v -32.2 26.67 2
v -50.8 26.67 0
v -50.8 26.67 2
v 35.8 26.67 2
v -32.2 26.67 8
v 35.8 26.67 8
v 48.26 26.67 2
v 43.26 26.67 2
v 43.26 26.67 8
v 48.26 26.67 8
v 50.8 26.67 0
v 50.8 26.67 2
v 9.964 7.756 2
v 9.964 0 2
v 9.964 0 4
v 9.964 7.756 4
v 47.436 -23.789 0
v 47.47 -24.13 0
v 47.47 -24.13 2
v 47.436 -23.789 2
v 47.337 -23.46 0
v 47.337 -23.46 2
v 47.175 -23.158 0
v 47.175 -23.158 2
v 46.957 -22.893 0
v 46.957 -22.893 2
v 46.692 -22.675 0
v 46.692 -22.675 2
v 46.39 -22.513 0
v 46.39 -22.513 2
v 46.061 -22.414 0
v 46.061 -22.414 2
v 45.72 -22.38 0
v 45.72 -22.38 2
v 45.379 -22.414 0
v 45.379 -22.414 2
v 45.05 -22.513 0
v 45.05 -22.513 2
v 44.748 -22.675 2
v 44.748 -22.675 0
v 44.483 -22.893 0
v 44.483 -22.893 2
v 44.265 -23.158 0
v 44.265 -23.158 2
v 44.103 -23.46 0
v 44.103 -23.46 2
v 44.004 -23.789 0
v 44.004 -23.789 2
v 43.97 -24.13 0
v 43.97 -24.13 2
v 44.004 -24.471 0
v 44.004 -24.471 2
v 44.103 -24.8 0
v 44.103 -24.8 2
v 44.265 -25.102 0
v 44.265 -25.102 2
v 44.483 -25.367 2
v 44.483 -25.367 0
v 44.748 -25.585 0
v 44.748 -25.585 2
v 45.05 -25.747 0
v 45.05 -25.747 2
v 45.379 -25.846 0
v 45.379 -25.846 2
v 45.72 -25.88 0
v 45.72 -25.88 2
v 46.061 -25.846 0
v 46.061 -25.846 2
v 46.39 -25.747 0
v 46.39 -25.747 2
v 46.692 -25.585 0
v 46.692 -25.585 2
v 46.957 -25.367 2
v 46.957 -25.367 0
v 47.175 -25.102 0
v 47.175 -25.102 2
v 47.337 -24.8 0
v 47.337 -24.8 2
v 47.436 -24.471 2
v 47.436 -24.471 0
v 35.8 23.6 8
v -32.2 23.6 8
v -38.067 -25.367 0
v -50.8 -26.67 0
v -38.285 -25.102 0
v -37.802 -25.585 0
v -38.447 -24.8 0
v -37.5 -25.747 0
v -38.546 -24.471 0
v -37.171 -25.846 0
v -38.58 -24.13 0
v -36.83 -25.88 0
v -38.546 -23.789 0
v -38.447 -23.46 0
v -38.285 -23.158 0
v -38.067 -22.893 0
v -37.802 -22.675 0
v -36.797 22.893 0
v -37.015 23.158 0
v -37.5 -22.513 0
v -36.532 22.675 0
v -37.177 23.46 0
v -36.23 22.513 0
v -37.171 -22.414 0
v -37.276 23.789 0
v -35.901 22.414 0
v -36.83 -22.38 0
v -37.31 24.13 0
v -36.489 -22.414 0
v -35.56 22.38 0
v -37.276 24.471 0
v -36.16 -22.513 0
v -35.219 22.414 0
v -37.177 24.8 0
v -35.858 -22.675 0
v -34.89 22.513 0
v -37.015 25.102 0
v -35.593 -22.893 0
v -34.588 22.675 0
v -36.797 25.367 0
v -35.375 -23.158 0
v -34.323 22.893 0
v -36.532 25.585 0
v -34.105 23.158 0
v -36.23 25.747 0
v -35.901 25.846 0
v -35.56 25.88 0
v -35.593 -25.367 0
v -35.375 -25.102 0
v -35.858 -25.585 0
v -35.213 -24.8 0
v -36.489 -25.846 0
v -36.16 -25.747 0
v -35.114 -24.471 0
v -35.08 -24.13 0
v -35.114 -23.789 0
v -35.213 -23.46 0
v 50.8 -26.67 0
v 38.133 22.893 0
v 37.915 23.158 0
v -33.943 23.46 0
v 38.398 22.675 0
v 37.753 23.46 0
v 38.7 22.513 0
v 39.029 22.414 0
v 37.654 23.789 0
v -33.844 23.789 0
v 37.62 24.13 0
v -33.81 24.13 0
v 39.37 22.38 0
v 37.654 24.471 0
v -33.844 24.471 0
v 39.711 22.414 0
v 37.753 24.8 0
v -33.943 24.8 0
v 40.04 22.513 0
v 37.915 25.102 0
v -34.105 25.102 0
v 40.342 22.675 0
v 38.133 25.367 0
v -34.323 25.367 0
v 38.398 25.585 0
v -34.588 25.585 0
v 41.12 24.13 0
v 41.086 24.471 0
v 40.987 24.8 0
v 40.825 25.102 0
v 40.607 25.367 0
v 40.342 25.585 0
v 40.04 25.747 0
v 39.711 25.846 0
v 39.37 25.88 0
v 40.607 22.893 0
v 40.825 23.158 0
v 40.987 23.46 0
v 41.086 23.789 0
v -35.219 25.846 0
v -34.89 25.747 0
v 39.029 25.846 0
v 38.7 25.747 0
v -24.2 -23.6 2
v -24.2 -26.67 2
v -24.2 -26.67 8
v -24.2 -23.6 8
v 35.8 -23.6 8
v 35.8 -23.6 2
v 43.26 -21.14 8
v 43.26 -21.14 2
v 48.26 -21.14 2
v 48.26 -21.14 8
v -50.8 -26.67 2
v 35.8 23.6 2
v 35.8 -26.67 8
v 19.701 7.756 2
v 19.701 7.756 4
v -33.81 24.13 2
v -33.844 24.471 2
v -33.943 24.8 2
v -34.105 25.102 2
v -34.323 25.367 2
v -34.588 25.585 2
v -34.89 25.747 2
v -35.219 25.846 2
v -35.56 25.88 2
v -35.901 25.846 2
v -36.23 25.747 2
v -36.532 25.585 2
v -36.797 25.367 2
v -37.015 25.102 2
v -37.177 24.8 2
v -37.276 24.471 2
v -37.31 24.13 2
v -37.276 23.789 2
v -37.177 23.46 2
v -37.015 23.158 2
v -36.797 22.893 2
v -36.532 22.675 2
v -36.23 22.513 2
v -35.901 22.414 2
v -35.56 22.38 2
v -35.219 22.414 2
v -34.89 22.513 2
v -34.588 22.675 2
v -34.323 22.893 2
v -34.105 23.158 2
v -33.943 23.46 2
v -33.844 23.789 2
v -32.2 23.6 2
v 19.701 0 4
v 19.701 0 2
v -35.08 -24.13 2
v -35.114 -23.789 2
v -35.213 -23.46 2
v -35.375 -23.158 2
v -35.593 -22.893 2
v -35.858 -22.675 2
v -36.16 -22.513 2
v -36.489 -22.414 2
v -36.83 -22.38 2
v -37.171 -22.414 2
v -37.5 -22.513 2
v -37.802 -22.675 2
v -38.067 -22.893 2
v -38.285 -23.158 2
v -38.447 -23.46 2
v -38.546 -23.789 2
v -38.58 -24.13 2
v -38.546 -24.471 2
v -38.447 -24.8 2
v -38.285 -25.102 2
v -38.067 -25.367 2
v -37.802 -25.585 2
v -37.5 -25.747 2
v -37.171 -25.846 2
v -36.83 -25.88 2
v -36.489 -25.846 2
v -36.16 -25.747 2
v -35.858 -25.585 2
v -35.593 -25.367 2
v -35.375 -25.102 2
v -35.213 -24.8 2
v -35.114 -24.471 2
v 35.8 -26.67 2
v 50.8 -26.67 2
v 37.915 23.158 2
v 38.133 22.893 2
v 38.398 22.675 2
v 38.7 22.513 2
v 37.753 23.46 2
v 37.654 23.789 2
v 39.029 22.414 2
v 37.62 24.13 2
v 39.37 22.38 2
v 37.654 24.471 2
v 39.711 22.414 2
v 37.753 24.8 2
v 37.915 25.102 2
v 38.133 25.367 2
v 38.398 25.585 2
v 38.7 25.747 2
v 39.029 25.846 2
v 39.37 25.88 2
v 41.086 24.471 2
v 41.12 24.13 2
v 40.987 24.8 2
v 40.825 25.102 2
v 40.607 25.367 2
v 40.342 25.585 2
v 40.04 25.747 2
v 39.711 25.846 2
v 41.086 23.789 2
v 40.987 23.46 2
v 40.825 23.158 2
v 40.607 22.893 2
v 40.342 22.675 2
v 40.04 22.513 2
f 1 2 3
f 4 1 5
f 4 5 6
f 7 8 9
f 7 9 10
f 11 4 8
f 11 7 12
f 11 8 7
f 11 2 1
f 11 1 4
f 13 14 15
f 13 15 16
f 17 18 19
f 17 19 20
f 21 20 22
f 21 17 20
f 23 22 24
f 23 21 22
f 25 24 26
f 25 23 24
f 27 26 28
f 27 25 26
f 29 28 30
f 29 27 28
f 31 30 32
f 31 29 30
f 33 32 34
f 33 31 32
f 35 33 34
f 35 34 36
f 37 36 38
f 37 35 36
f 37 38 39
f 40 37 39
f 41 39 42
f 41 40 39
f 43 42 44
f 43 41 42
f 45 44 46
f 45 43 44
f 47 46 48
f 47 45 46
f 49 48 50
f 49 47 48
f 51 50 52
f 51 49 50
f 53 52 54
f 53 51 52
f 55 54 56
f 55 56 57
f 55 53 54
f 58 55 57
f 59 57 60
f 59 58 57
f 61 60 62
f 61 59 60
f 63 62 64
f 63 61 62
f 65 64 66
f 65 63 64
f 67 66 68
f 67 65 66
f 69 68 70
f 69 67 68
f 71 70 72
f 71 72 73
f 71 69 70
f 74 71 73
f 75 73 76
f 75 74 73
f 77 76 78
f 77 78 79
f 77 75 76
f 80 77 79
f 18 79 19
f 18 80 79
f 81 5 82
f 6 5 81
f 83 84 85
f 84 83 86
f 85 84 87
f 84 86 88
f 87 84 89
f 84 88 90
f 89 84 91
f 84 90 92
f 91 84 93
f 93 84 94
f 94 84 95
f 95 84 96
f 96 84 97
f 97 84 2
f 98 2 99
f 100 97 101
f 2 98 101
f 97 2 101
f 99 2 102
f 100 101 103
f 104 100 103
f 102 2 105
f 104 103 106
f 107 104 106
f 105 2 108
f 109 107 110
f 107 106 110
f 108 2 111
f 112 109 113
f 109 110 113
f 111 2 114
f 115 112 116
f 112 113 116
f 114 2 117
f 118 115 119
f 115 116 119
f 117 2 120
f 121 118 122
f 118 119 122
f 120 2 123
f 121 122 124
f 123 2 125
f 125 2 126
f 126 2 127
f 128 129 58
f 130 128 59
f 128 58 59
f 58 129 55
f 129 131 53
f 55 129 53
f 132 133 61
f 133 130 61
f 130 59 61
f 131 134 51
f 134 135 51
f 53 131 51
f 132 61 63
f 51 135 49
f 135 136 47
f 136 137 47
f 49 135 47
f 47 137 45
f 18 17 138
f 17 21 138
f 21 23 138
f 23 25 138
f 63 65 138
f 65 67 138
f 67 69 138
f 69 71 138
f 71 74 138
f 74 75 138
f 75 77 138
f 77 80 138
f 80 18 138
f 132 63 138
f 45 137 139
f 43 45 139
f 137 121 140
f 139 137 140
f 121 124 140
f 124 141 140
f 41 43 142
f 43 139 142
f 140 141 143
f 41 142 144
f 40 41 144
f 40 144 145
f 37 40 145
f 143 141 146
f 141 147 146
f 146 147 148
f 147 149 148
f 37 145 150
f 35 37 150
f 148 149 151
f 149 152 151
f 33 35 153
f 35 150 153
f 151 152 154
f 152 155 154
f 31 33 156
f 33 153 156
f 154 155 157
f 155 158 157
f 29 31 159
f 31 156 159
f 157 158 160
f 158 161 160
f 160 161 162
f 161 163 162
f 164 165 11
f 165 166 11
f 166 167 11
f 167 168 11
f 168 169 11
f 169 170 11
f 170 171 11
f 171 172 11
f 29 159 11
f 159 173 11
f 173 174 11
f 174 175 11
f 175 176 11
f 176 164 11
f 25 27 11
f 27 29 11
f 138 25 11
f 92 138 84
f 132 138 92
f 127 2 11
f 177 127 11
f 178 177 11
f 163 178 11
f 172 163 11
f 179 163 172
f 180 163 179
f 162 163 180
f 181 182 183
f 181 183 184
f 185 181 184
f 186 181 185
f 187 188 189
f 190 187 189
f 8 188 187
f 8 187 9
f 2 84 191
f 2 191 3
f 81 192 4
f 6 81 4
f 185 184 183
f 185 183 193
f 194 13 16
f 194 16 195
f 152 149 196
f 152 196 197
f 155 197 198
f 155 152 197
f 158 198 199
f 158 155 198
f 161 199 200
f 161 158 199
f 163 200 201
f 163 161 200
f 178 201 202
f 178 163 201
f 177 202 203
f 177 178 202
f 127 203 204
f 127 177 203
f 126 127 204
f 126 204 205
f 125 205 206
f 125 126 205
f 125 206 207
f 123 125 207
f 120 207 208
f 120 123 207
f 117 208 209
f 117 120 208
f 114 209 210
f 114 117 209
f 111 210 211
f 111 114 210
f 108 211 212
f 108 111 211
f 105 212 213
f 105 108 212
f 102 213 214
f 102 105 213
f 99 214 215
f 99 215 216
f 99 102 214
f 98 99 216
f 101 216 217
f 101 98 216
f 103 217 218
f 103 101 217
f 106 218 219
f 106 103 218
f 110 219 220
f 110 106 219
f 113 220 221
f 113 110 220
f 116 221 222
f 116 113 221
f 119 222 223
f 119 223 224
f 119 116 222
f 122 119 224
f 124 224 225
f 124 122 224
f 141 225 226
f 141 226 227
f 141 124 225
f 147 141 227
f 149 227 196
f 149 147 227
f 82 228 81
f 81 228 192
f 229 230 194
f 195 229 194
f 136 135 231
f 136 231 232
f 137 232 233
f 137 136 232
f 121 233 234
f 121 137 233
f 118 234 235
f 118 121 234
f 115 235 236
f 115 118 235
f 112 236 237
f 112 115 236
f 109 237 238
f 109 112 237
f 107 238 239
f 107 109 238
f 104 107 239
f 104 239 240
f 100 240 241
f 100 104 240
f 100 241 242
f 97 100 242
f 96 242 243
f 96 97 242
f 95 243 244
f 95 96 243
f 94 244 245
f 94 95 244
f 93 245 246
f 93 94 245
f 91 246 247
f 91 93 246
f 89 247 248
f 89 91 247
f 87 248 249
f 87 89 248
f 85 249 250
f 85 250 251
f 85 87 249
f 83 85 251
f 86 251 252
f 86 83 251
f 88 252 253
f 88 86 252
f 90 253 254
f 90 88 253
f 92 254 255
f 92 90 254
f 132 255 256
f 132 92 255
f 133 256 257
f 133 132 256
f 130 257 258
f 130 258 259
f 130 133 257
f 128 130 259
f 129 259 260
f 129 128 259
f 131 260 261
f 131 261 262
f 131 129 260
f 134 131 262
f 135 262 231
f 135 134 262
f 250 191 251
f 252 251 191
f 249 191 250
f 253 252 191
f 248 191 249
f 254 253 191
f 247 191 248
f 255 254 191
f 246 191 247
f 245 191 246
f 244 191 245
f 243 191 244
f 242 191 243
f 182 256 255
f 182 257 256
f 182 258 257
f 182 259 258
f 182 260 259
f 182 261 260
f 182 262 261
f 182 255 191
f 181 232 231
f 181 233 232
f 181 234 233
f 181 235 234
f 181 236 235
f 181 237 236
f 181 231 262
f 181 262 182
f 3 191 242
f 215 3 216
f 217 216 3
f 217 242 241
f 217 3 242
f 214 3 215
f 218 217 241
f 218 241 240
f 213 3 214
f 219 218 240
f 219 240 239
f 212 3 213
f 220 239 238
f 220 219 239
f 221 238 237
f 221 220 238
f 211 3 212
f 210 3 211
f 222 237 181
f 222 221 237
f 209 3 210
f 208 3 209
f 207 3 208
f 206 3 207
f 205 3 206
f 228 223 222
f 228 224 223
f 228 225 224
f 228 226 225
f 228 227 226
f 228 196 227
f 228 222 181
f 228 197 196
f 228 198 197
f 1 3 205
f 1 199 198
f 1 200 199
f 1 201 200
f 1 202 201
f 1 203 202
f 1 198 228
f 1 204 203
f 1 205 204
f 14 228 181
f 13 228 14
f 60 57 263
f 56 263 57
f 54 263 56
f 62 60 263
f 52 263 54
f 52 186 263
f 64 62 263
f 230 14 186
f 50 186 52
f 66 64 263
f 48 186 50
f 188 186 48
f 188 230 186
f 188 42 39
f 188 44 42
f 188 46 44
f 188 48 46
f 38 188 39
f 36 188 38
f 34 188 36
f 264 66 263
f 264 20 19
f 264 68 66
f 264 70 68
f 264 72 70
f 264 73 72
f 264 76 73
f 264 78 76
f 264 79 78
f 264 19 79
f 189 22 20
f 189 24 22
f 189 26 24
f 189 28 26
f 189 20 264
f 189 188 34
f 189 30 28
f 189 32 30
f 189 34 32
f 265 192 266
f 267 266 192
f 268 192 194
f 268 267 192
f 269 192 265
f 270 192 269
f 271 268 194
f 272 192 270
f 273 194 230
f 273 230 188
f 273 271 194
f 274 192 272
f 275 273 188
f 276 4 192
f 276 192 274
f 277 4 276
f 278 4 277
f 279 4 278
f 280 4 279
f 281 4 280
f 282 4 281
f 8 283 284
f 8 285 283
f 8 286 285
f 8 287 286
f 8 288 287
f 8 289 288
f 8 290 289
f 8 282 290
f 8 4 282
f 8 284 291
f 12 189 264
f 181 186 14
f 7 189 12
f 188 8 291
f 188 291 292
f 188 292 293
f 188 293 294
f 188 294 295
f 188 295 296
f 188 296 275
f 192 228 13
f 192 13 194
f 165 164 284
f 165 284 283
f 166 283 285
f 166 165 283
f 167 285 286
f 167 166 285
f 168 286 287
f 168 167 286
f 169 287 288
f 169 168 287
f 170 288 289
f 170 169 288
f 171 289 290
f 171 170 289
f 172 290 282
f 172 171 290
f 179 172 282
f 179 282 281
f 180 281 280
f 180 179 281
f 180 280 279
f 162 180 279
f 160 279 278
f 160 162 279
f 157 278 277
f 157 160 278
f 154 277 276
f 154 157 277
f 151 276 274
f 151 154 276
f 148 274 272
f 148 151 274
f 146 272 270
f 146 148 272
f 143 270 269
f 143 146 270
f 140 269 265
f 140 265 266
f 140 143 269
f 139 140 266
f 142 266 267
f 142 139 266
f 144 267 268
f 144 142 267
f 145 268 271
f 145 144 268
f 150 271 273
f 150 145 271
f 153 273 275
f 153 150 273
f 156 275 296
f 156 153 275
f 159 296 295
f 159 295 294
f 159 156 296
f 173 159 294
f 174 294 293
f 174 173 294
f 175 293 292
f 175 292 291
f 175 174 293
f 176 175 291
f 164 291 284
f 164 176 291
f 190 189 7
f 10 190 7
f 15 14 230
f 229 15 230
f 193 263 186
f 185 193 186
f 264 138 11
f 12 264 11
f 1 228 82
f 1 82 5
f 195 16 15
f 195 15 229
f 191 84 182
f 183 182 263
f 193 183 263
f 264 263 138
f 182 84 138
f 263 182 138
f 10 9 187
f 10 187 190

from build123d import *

# Parameters (mm, degrees)
SKETCH_1_W      = 101.6
SKETCH_1_H      = 53.34
SKETCH_1_R      = 1.75
EXTRUDE_1_DEPTH = 2
SKETCH_2_W      = 68
SKETCH_2_H      = 3.07
SKETCH_2_W_2    = 60
SKETCH_2_W_3    = 5
SKETCH_2_H_2    = 47.81
EXTRUDE_2_DEPTH = 6
SKETCH_3_W      = 9.737104959
SKETCH_3_H      = 7.755742322
EXTRUDE_3_DEPTH = 2


with BuildPart() as part:
    # 草图1 → 凸台-拉伸1 (new body)
    with BuildSketch(Plane.XY):
        Rectangle(SKETCH_1_W, SKETCH_1_H)
        with Locations((-35.56, 24.13)):
            Circle(SKETCH_1_R, mode=Mode.SUBTRACT)
        with Locations((-36.83, -24.13)):
            Circle(SKETCH_1_R, mode=Mode.SUBTRACT)
        with Locations((45.72, -24.13)):
            Circle(SKETCH_1_R, mode=Mode.SUBTRACT)
        with Locations((39.37, 24.13)):
            Circle(SKETCH_1_R, mode=Mode.SUBTRACT)
    extrude(amount=EXTRUDE_1_DEPTH)

    # 草图2 → 凸台-拉伸2 (add)
    with BuildSketch(Plane.XY.offset(2)):
        with Locations((1.8, 25.135)):
            Rectangle(SKETCH_2_W, SKETCH_2_H)
        with Locations((5.8, -25.135)):
            Rectangle(SKETCH_2_W_2, SKETCH_2_H)
        with Locations((45.76, 2.765)):
            Rectangle(SKETCH_2_W_3, SKETCH_2_H_2)
    extrude(amount=EXTRUDE_2_DEPTH)

    # 草图3 → 凸台-拉伸3 (add)
    with BuildSketch(Plane.XY.offset(2)):
        with Locations((14.832089241, 3.877871161)):
            Rectangle(SKETCH_3_W, SKETCH_3_H)
    extrude(amount=EXTRUDE_3_DEPTH)


solid = part.part
